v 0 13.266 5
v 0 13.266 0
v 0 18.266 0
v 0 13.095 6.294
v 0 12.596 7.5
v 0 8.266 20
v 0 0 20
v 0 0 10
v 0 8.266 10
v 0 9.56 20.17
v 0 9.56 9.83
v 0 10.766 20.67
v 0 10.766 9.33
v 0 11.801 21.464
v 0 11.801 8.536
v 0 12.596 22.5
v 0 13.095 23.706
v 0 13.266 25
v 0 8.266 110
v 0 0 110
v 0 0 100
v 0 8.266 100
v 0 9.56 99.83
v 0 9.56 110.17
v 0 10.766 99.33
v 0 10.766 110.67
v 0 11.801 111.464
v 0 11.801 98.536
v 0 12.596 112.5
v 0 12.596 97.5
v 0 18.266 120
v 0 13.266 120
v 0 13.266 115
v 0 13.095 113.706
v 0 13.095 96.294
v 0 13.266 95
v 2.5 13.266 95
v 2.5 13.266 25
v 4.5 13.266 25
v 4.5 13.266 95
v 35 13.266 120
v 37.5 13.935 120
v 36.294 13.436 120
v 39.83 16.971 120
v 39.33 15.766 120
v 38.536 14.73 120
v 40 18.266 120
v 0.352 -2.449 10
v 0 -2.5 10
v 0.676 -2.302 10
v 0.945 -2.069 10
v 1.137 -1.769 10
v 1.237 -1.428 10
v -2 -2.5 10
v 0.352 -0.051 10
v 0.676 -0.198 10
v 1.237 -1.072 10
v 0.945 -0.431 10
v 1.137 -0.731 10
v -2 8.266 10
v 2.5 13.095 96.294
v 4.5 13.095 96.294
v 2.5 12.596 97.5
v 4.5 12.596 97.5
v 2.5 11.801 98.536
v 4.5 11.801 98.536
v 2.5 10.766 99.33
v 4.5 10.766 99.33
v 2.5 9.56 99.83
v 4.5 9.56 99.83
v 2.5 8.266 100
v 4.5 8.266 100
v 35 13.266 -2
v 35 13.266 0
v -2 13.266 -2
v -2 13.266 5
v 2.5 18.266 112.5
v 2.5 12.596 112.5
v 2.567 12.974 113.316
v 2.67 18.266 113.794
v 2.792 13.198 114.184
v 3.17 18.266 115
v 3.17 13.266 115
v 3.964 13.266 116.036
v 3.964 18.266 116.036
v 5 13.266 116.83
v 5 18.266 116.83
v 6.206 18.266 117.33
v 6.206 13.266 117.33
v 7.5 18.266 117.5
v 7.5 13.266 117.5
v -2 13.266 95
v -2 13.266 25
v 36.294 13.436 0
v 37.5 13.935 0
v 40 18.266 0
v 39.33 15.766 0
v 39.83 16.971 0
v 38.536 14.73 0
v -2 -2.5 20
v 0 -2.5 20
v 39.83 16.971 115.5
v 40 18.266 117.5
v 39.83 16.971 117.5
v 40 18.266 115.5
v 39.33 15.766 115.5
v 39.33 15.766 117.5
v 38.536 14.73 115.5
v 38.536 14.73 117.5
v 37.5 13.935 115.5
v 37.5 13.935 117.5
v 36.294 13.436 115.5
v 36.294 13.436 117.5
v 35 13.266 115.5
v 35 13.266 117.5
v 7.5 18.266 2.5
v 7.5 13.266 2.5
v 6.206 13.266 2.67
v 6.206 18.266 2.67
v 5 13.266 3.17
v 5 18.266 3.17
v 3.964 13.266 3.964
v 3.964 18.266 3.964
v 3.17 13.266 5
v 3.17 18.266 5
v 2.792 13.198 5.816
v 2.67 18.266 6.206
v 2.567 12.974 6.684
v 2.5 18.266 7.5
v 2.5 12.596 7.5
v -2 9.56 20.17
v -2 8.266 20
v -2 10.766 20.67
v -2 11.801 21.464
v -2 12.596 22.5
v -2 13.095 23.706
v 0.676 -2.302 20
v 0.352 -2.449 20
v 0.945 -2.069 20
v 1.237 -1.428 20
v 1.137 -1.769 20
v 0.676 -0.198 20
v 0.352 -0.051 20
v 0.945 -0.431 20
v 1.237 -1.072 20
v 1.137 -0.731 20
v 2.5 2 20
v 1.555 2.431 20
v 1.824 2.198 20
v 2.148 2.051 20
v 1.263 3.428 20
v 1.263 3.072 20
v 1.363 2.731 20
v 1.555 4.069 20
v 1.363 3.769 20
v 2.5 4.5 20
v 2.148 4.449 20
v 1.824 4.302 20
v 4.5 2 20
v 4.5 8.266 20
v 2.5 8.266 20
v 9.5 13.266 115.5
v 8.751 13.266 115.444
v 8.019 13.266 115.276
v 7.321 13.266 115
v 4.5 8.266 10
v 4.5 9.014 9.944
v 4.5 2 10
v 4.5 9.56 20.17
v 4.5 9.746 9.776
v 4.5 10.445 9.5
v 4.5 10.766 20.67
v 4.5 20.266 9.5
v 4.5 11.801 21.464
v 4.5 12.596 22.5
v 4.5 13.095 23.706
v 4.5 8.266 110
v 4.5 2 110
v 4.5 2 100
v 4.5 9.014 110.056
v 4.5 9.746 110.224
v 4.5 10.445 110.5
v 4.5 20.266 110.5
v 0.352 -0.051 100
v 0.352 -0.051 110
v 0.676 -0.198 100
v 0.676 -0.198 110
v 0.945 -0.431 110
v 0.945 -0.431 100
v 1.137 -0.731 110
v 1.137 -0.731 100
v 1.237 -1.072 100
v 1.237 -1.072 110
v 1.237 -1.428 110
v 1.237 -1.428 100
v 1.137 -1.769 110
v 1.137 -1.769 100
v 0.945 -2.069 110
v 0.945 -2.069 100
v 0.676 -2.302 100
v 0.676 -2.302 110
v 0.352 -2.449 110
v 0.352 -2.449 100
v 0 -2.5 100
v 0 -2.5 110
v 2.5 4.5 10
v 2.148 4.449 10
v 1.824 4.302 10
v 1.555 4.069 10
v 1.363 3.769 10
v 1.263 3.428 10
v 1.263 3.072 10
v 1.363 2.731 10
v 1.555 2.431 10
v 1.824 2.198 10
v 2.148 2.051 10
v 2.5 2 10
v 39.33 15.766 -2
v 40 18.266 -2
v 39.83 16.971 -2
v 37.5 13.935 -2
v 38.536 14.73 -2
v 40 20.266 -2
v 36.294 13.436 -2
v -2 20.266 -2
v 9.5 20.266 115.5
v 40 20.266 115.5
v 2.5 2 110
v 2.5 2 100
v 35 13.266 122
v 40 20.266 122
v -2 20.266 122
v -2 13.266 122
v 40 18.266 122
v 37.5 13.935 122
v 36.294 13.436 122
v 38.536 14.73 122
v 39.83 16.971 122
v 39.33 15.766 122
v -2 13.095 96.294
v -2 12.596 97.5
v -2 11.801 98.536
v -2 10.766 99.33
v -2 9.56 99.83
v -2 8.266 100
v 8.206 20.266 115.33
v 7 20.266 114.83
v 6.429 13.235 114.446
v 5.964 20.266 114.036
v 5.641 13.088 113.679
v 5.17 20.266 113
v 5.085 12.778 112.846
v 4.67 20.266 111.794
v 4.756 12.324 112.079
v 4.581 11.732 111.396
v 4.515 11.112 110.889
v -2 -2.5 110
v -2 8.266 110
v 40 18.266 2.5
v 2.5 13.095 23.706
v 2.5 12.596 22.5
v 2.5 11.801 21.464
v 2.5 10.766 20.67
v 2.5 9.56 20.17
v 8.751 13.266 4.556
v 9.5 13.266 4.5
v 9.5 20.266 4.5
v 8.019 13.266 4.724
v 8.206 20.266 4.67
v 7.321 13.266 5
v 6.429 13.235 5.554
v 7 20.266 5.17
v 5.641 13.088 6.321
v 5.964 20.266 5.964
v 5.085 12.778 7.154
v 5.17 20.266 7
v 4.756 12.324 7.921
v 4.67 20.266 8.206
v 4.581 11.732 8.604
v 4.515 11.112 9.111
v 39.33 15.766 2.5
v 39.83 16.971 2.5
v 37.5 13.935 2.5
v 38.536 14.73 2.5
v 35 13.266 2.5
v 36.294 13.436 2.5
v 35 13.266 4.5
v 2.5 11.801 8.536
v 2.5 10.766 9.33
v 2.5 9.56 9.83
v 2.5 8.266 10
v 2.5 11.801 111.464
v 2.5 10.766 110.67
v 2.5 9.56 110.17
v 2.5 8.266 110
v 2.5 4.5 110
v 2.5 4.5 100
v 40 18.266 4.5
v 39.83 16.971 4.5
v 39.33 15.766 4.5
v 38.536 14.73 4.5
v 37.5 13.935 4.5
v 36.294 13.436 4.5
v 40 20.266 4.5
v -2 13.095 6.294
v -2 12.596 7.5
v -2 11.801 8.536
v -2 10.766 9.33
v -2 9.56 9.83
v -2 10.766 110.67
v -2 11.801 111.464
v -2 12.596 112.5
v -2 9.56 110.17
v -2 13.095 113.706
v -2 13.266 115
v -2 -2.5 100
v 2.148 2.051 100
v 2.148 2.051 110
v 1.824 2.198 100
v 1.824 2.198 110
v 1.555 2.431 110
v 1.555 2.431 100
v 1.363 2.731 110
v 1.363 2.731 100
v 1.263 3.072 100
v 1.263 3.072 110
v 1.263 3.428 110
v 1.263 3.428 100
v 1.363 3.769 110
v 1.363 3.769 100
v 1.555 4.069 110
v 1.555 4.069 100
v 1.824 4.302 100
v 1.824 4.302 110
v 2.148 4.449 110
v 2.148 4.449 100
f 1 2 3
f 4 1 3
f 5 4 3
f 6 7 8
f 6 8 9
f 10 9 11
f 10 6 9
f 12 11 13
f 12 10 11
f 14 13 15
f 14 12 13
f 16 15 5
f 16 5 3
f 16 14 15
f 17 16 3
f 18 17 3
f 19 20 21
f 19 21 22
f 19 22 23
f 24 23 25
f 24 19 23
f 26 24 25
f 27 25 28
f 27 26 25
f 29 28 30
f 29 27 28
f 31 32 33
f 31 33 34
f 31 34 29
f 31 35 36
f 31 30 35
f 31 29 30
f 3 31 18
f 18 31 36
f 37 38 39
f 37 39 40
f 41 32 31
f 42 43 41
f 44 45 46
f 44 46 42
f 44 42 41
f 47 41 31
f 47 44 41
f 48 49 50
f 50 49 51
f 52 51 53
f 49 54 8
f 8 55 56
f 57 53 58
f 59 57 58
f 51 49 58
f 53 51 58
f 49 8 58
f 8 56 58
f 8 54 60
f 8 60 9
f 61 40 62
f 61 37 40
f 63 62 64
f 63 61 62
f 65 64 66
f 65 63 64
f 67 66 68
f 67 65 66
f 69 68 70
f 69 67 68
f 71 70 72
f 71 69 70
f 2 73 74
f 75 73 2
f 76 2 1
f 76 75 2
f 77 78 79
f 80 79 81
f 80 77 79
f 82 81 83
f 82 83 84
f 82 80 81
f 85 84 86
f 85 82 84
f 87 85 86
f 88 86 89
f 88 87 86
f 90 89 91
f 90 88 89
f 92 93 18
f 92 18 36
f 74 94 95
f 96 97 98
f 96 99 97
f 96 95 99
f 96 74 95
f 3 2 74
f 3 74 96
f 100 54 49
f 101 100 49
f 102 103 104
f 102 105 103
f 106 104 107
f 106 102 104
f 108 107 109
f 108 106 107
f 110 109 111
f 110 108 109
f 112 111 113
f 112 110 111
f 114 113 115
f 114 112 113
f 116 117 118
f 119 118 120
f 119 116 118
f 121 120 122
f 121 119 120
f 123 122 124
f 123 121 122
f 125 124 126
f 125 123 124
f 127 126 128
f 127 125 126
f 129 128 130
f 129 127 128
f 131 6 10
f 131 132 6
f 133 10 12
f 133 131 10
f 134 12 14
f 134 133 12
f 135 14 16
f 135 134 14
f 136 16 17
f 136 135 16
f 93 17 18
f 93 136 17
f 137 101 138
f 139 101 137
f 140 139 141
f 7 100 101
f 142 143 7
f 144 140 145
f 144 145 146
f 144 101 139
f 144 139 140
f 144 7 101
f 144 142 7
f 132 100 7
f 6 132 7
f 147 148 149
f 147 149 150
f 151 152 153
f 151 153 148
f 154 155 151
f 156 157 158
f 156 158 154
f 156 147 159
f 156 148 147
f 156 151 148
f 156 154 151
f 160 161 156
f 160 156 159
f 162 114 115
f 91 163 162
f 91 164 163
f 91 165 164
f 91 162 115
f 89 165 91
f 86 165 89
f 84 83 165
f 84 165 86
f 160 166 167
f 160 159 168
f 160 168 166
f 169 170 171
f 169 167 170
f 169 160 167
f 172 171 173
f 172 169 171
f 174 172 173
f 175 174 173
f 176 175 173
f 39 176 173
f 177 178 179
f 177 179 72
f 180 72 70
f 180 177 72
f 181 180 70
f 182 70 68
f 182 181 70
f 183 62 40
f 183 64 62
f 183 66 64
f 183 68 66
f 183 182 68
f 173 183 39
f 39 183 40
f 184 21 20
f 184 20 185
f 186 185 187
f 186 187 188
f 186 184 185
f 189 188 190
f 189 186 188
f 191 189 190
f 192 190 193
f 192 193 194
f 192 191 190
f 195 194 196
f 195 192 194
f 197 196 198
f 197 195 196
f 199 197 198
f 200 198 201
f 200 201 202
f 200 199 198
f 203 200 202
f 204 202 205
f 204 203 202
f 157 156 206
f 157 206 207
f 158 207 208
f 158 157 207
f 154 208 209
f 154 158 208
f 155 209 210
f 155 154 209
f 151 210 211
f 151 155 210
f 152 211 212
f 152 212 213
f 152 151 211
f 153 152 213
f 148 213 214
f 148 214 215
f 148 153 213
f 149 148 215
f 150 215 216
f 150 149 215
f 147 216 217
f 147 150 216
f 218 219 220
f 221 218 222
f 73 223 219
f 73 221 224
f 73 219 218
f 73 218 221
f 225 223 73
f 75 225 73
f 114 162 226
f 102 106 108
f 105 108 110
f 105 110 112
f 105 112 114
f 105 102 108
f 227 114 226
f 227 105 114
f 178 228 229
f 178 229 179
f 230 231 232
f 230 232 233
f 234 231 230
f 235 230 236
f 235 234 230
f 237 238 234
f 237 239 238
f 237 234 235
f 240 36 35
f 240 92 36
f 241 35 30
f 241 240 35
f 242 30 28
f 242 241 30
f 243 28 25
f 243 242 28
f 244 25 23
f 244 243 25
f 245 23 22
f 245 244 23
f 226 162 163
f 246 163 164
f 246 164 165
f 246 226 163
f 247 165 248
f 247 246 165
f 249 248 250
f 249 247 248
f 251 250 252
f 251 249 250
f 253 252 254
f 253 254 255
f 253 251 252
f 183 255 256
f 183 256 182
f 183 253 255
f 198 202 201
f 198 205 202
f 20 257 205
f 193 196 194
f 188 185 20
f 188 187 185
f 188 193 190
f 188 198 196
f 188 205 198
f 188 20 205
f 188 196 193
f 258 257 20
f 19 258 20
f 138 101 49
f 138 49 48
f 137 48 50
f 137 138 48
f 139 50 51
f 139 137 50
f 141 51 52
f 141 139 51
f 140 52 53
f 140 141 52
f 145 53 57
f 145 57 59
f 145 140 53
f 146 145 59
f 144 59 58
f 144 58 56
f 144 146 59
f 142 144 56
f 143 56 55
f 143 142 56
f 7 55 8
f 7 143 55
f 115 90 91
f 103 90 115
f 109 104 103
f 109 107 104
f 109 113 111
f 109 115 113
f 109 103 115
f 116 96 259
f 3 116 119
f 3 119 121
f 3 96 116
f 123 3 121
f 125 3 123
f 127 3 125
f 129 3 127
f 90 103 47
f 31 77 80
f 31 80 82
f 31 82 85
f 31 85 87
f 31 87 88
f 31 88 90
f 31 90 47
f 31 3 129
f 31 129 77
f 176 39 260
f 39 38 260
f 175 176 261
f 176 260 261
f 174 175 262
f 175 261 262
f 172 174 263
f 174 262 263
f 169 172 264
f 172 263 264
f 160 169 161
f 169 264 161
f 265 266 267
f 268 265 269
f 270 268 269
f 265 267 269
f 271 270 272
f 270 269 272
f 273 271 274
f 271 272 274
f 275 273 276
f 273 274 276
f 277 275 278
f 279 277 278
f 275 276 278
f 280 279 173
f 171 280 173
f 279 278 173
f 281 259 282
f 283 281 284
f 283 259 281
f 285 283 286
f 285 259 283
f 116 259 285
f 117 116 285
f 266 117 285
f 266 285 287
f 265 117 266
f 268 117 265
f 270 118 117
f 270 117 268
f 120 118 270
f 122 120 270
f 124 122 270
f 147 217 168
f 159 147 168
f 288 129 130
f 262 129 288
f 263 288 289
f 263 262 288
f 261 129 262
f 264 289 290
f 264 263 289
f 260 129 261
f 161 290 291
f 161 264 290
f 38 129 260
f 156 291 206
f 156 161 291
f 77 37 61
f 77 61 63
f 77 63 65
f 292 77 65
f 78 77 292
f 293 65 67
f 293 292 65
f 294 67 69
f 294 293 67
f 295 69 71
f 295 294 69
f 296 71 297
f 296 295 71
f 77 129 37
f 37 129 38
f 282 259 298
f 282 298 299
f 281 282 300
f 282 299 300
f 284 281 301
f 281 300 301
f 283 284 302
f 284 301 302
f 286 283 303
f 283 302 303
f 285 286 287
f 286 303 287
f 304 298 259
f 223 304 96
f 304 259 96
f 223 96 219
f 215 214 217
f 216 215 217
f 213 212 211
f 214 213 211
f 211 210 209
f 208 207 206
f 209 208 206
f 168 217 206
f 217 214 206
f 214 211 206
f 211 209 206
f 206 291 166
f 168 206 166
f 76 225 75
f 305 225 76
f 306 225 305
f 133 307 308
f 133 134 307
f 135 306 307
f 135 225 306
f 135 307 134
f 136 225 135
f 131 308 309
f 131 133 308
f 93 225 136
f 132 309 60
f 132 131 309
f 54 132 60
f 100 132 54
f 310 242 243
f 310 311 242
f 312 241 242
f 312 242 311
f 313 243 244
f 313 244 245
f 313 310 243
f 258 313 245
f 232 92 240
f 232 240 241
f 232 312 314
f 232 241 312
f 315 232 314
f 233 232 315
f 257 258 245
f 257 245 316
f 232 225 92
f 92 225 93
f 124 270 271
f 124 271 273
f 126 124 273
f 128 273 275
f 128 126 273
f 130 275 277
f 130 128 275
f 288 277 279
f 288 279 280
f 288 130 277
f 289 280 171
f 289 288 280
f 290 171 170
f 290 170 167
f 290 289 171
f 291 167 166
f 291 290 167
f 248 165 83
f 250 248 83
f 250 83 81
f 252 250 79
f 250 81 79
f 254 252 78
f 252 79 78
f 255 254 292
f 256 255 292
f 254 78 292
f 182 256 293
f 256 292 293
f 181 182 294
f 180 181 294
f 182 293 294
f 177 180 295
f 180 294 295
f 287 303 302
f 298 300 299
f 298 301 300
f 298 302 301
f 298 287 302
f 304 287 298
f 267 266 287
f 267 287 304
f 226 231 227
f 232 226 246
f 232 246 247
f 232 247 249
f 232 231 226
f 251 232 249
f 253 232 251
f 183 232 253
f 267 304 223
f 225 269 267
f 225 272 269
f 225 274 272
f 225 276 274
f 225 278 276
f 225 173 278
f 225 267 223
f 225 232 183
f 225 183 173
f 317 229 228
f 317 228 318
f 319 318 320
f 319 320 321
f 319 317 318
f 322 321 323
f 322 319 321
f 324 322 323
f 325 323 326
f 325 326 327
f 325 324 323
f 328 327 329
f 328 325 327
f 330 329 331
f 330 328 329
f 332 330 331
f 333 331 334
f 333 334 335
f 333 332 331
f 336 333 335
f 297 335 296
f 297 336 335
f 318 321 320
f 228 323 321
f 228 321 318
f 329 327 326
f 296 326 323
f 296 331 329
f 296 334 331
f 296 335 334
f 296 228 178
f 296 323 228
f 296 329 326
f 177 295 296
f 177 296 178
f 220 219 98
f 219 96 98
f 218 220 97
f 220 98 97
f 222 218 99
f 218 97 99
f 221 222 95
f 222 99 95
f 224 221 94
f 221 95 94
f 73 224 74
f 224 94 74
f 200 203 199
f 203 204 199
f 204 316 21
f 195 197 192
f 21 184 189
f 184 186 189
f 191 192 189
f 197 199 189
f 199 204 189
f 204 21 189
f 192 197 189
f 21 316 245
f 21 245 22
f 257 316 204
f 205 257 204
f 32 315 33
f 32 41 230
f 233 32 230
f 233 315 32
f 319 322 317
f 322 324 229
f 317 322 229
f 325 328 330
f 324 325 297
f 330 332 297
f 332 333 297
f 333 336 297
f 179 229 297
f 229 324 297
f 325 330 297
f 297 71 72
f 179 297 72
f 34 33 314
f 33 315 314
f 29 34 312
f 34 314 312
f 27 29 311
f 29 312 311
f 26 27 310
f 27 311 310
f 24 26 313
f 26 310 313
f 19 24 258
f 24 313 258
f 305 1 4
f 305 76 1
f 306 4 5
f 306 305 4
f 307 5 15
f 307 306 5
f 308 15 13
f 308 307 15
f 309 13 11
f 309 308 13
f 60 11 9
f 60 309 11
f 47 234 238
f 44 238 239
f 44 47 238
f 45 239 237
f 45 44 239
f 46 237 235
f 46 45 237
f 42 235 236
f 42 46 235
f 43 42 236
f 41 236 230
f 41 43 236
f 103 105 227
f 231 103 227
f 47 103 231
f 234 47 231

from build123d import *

# Parameters (mm, degrees)
F10_R = 5
F11_R = 5
F12_R = 5


with BuildPart() as f2:
    # F2: sweep along a path in F1
    with BuildLine(Plane.XZ) as f2_path:
        Line((40, 0), (0, 0))
        Line((0, 0), (0, 120))
        Line((0, 120), (40, 120))
    # F0 (on Top) → F2 (sweep)
    with BuildSketch(Plane.XY):
        Polygon((-2, 13.2655382454), (0, 13.2655382454), (0, 18.2655382454), (2.5, 18.2655382454), (2.5, 13.2655382454), (4.5, 13.2655382454), (4.5, 20.2655382454), (-2, 20.2655382454), align=None)
    sweep(path=f2_path.line, transition=Transition.RIGHT)

    # F8: sweep along a path in F3
    with BuildLine(Plane.XZ) as f8_path:
        Line((0, 10), (0, 20))
    # F6 (on plane+point) → F8 (sweep)
    with BuildSketch(Plane.XY.offset(10)):
        with BuildLine():
            ThreePointArc((0, -2.5), (1.25, -1.25), (0, 0))
            Line((0, 0), (0, 13.2655382454))
            Line((0, 13.2655382454), (-2, 13.2655382454))
            Line((-2, 13.2655382454), (-2, -2.5))
            Line((-2, -2.5), (0, -2.5))
        make_face()
        with BuildLine():
            Line((4.5, 13.2655382454), (2.5, 13.2655382454))
            Line((2.5, 13.2655382454), (2.5, 4.5))
            ThreePointArc((2.5, 4.5), (1.25, 3.25), (2.5, 2))
            Line((2.5, 2), (4.5, 2))
            Line((4.5, 2), (4.5, 13.2655382454))
        make_face()
    sweep(path=f8_path.line)

    # F9: sweep along a path in F3
    with BuildLine(Plane.XZ) as f9_path:
        Line((0, 110), (0, 100))
    # F7 (on plane+point) → F9 (sweep)
    with BuildSketch(Plane.XY.offset(100)):
        with BuildLine():
            ThreePointArc((0, -2.5), (1.25, -1.25), (0, 0))
            Line((0, 0), (0, 13.2655382454))
            Line((0, 13.2655382454), (-2, 13.2655382454))
            Line((-2, 13.2655382454), (-2, -2.5))
            Line((-2, -2.5), (0, -2.5))
        make_face()
        with BuildLine():
            Line((4.5, 13.2655382454), (2.5, 13.2655382454))
            Line((2.5, 13.2655382454), (2.5, 4.5))
            ThreePointArc((2.5, 4.5), (1.25, 3.25), (2.5, 2))
            Line((2.5, 2), (4.5, 2))
            Line((4.5, 2), (4.5, 13.2655382454))
        make_face()
    sweep(path=f9_path.line)

    # F10
    f10_edges = [f2.edges().sort_by_distance(p)[0] for p in [
        (-1, 13.265538, 10),
        (3.5, 13.265538, 10),
        (-1, 13.265538, 20),
        (3.5, 13.265538, 20),
        (-1, 13.265538, 100),
        (3.5, 13.265538, 100),
        (3.5, 13.265538, 110),
        (-1, 13.265538, 110),
    ]]
    fillet(f10_edges, radius=F10_R)

    # F11
    f11_edges = [f2.edges().sort_by_distance(p)[0] for p in [
        (2.5, 15.765538, 117.5),
        (4.5, 16.765538, 115.5),
        (4.5, 16.765538, 4.5),
        (2.5, 15.765538, 2.5),
    ]]
    fillet(f11_edges, radius=F11_R)

    # F12
    f12_edges = [f2.edges().sort_by_distance(p)[0] for p in [
        (40, 13.265538, -1),
        (40, 13.265538, 3.5),
        (40, 13.265538, 121),
        (40, 13.265538, 116.5),
    ]]
    fillet(f12_edges, radius=F12_R)


solid = f2.part
